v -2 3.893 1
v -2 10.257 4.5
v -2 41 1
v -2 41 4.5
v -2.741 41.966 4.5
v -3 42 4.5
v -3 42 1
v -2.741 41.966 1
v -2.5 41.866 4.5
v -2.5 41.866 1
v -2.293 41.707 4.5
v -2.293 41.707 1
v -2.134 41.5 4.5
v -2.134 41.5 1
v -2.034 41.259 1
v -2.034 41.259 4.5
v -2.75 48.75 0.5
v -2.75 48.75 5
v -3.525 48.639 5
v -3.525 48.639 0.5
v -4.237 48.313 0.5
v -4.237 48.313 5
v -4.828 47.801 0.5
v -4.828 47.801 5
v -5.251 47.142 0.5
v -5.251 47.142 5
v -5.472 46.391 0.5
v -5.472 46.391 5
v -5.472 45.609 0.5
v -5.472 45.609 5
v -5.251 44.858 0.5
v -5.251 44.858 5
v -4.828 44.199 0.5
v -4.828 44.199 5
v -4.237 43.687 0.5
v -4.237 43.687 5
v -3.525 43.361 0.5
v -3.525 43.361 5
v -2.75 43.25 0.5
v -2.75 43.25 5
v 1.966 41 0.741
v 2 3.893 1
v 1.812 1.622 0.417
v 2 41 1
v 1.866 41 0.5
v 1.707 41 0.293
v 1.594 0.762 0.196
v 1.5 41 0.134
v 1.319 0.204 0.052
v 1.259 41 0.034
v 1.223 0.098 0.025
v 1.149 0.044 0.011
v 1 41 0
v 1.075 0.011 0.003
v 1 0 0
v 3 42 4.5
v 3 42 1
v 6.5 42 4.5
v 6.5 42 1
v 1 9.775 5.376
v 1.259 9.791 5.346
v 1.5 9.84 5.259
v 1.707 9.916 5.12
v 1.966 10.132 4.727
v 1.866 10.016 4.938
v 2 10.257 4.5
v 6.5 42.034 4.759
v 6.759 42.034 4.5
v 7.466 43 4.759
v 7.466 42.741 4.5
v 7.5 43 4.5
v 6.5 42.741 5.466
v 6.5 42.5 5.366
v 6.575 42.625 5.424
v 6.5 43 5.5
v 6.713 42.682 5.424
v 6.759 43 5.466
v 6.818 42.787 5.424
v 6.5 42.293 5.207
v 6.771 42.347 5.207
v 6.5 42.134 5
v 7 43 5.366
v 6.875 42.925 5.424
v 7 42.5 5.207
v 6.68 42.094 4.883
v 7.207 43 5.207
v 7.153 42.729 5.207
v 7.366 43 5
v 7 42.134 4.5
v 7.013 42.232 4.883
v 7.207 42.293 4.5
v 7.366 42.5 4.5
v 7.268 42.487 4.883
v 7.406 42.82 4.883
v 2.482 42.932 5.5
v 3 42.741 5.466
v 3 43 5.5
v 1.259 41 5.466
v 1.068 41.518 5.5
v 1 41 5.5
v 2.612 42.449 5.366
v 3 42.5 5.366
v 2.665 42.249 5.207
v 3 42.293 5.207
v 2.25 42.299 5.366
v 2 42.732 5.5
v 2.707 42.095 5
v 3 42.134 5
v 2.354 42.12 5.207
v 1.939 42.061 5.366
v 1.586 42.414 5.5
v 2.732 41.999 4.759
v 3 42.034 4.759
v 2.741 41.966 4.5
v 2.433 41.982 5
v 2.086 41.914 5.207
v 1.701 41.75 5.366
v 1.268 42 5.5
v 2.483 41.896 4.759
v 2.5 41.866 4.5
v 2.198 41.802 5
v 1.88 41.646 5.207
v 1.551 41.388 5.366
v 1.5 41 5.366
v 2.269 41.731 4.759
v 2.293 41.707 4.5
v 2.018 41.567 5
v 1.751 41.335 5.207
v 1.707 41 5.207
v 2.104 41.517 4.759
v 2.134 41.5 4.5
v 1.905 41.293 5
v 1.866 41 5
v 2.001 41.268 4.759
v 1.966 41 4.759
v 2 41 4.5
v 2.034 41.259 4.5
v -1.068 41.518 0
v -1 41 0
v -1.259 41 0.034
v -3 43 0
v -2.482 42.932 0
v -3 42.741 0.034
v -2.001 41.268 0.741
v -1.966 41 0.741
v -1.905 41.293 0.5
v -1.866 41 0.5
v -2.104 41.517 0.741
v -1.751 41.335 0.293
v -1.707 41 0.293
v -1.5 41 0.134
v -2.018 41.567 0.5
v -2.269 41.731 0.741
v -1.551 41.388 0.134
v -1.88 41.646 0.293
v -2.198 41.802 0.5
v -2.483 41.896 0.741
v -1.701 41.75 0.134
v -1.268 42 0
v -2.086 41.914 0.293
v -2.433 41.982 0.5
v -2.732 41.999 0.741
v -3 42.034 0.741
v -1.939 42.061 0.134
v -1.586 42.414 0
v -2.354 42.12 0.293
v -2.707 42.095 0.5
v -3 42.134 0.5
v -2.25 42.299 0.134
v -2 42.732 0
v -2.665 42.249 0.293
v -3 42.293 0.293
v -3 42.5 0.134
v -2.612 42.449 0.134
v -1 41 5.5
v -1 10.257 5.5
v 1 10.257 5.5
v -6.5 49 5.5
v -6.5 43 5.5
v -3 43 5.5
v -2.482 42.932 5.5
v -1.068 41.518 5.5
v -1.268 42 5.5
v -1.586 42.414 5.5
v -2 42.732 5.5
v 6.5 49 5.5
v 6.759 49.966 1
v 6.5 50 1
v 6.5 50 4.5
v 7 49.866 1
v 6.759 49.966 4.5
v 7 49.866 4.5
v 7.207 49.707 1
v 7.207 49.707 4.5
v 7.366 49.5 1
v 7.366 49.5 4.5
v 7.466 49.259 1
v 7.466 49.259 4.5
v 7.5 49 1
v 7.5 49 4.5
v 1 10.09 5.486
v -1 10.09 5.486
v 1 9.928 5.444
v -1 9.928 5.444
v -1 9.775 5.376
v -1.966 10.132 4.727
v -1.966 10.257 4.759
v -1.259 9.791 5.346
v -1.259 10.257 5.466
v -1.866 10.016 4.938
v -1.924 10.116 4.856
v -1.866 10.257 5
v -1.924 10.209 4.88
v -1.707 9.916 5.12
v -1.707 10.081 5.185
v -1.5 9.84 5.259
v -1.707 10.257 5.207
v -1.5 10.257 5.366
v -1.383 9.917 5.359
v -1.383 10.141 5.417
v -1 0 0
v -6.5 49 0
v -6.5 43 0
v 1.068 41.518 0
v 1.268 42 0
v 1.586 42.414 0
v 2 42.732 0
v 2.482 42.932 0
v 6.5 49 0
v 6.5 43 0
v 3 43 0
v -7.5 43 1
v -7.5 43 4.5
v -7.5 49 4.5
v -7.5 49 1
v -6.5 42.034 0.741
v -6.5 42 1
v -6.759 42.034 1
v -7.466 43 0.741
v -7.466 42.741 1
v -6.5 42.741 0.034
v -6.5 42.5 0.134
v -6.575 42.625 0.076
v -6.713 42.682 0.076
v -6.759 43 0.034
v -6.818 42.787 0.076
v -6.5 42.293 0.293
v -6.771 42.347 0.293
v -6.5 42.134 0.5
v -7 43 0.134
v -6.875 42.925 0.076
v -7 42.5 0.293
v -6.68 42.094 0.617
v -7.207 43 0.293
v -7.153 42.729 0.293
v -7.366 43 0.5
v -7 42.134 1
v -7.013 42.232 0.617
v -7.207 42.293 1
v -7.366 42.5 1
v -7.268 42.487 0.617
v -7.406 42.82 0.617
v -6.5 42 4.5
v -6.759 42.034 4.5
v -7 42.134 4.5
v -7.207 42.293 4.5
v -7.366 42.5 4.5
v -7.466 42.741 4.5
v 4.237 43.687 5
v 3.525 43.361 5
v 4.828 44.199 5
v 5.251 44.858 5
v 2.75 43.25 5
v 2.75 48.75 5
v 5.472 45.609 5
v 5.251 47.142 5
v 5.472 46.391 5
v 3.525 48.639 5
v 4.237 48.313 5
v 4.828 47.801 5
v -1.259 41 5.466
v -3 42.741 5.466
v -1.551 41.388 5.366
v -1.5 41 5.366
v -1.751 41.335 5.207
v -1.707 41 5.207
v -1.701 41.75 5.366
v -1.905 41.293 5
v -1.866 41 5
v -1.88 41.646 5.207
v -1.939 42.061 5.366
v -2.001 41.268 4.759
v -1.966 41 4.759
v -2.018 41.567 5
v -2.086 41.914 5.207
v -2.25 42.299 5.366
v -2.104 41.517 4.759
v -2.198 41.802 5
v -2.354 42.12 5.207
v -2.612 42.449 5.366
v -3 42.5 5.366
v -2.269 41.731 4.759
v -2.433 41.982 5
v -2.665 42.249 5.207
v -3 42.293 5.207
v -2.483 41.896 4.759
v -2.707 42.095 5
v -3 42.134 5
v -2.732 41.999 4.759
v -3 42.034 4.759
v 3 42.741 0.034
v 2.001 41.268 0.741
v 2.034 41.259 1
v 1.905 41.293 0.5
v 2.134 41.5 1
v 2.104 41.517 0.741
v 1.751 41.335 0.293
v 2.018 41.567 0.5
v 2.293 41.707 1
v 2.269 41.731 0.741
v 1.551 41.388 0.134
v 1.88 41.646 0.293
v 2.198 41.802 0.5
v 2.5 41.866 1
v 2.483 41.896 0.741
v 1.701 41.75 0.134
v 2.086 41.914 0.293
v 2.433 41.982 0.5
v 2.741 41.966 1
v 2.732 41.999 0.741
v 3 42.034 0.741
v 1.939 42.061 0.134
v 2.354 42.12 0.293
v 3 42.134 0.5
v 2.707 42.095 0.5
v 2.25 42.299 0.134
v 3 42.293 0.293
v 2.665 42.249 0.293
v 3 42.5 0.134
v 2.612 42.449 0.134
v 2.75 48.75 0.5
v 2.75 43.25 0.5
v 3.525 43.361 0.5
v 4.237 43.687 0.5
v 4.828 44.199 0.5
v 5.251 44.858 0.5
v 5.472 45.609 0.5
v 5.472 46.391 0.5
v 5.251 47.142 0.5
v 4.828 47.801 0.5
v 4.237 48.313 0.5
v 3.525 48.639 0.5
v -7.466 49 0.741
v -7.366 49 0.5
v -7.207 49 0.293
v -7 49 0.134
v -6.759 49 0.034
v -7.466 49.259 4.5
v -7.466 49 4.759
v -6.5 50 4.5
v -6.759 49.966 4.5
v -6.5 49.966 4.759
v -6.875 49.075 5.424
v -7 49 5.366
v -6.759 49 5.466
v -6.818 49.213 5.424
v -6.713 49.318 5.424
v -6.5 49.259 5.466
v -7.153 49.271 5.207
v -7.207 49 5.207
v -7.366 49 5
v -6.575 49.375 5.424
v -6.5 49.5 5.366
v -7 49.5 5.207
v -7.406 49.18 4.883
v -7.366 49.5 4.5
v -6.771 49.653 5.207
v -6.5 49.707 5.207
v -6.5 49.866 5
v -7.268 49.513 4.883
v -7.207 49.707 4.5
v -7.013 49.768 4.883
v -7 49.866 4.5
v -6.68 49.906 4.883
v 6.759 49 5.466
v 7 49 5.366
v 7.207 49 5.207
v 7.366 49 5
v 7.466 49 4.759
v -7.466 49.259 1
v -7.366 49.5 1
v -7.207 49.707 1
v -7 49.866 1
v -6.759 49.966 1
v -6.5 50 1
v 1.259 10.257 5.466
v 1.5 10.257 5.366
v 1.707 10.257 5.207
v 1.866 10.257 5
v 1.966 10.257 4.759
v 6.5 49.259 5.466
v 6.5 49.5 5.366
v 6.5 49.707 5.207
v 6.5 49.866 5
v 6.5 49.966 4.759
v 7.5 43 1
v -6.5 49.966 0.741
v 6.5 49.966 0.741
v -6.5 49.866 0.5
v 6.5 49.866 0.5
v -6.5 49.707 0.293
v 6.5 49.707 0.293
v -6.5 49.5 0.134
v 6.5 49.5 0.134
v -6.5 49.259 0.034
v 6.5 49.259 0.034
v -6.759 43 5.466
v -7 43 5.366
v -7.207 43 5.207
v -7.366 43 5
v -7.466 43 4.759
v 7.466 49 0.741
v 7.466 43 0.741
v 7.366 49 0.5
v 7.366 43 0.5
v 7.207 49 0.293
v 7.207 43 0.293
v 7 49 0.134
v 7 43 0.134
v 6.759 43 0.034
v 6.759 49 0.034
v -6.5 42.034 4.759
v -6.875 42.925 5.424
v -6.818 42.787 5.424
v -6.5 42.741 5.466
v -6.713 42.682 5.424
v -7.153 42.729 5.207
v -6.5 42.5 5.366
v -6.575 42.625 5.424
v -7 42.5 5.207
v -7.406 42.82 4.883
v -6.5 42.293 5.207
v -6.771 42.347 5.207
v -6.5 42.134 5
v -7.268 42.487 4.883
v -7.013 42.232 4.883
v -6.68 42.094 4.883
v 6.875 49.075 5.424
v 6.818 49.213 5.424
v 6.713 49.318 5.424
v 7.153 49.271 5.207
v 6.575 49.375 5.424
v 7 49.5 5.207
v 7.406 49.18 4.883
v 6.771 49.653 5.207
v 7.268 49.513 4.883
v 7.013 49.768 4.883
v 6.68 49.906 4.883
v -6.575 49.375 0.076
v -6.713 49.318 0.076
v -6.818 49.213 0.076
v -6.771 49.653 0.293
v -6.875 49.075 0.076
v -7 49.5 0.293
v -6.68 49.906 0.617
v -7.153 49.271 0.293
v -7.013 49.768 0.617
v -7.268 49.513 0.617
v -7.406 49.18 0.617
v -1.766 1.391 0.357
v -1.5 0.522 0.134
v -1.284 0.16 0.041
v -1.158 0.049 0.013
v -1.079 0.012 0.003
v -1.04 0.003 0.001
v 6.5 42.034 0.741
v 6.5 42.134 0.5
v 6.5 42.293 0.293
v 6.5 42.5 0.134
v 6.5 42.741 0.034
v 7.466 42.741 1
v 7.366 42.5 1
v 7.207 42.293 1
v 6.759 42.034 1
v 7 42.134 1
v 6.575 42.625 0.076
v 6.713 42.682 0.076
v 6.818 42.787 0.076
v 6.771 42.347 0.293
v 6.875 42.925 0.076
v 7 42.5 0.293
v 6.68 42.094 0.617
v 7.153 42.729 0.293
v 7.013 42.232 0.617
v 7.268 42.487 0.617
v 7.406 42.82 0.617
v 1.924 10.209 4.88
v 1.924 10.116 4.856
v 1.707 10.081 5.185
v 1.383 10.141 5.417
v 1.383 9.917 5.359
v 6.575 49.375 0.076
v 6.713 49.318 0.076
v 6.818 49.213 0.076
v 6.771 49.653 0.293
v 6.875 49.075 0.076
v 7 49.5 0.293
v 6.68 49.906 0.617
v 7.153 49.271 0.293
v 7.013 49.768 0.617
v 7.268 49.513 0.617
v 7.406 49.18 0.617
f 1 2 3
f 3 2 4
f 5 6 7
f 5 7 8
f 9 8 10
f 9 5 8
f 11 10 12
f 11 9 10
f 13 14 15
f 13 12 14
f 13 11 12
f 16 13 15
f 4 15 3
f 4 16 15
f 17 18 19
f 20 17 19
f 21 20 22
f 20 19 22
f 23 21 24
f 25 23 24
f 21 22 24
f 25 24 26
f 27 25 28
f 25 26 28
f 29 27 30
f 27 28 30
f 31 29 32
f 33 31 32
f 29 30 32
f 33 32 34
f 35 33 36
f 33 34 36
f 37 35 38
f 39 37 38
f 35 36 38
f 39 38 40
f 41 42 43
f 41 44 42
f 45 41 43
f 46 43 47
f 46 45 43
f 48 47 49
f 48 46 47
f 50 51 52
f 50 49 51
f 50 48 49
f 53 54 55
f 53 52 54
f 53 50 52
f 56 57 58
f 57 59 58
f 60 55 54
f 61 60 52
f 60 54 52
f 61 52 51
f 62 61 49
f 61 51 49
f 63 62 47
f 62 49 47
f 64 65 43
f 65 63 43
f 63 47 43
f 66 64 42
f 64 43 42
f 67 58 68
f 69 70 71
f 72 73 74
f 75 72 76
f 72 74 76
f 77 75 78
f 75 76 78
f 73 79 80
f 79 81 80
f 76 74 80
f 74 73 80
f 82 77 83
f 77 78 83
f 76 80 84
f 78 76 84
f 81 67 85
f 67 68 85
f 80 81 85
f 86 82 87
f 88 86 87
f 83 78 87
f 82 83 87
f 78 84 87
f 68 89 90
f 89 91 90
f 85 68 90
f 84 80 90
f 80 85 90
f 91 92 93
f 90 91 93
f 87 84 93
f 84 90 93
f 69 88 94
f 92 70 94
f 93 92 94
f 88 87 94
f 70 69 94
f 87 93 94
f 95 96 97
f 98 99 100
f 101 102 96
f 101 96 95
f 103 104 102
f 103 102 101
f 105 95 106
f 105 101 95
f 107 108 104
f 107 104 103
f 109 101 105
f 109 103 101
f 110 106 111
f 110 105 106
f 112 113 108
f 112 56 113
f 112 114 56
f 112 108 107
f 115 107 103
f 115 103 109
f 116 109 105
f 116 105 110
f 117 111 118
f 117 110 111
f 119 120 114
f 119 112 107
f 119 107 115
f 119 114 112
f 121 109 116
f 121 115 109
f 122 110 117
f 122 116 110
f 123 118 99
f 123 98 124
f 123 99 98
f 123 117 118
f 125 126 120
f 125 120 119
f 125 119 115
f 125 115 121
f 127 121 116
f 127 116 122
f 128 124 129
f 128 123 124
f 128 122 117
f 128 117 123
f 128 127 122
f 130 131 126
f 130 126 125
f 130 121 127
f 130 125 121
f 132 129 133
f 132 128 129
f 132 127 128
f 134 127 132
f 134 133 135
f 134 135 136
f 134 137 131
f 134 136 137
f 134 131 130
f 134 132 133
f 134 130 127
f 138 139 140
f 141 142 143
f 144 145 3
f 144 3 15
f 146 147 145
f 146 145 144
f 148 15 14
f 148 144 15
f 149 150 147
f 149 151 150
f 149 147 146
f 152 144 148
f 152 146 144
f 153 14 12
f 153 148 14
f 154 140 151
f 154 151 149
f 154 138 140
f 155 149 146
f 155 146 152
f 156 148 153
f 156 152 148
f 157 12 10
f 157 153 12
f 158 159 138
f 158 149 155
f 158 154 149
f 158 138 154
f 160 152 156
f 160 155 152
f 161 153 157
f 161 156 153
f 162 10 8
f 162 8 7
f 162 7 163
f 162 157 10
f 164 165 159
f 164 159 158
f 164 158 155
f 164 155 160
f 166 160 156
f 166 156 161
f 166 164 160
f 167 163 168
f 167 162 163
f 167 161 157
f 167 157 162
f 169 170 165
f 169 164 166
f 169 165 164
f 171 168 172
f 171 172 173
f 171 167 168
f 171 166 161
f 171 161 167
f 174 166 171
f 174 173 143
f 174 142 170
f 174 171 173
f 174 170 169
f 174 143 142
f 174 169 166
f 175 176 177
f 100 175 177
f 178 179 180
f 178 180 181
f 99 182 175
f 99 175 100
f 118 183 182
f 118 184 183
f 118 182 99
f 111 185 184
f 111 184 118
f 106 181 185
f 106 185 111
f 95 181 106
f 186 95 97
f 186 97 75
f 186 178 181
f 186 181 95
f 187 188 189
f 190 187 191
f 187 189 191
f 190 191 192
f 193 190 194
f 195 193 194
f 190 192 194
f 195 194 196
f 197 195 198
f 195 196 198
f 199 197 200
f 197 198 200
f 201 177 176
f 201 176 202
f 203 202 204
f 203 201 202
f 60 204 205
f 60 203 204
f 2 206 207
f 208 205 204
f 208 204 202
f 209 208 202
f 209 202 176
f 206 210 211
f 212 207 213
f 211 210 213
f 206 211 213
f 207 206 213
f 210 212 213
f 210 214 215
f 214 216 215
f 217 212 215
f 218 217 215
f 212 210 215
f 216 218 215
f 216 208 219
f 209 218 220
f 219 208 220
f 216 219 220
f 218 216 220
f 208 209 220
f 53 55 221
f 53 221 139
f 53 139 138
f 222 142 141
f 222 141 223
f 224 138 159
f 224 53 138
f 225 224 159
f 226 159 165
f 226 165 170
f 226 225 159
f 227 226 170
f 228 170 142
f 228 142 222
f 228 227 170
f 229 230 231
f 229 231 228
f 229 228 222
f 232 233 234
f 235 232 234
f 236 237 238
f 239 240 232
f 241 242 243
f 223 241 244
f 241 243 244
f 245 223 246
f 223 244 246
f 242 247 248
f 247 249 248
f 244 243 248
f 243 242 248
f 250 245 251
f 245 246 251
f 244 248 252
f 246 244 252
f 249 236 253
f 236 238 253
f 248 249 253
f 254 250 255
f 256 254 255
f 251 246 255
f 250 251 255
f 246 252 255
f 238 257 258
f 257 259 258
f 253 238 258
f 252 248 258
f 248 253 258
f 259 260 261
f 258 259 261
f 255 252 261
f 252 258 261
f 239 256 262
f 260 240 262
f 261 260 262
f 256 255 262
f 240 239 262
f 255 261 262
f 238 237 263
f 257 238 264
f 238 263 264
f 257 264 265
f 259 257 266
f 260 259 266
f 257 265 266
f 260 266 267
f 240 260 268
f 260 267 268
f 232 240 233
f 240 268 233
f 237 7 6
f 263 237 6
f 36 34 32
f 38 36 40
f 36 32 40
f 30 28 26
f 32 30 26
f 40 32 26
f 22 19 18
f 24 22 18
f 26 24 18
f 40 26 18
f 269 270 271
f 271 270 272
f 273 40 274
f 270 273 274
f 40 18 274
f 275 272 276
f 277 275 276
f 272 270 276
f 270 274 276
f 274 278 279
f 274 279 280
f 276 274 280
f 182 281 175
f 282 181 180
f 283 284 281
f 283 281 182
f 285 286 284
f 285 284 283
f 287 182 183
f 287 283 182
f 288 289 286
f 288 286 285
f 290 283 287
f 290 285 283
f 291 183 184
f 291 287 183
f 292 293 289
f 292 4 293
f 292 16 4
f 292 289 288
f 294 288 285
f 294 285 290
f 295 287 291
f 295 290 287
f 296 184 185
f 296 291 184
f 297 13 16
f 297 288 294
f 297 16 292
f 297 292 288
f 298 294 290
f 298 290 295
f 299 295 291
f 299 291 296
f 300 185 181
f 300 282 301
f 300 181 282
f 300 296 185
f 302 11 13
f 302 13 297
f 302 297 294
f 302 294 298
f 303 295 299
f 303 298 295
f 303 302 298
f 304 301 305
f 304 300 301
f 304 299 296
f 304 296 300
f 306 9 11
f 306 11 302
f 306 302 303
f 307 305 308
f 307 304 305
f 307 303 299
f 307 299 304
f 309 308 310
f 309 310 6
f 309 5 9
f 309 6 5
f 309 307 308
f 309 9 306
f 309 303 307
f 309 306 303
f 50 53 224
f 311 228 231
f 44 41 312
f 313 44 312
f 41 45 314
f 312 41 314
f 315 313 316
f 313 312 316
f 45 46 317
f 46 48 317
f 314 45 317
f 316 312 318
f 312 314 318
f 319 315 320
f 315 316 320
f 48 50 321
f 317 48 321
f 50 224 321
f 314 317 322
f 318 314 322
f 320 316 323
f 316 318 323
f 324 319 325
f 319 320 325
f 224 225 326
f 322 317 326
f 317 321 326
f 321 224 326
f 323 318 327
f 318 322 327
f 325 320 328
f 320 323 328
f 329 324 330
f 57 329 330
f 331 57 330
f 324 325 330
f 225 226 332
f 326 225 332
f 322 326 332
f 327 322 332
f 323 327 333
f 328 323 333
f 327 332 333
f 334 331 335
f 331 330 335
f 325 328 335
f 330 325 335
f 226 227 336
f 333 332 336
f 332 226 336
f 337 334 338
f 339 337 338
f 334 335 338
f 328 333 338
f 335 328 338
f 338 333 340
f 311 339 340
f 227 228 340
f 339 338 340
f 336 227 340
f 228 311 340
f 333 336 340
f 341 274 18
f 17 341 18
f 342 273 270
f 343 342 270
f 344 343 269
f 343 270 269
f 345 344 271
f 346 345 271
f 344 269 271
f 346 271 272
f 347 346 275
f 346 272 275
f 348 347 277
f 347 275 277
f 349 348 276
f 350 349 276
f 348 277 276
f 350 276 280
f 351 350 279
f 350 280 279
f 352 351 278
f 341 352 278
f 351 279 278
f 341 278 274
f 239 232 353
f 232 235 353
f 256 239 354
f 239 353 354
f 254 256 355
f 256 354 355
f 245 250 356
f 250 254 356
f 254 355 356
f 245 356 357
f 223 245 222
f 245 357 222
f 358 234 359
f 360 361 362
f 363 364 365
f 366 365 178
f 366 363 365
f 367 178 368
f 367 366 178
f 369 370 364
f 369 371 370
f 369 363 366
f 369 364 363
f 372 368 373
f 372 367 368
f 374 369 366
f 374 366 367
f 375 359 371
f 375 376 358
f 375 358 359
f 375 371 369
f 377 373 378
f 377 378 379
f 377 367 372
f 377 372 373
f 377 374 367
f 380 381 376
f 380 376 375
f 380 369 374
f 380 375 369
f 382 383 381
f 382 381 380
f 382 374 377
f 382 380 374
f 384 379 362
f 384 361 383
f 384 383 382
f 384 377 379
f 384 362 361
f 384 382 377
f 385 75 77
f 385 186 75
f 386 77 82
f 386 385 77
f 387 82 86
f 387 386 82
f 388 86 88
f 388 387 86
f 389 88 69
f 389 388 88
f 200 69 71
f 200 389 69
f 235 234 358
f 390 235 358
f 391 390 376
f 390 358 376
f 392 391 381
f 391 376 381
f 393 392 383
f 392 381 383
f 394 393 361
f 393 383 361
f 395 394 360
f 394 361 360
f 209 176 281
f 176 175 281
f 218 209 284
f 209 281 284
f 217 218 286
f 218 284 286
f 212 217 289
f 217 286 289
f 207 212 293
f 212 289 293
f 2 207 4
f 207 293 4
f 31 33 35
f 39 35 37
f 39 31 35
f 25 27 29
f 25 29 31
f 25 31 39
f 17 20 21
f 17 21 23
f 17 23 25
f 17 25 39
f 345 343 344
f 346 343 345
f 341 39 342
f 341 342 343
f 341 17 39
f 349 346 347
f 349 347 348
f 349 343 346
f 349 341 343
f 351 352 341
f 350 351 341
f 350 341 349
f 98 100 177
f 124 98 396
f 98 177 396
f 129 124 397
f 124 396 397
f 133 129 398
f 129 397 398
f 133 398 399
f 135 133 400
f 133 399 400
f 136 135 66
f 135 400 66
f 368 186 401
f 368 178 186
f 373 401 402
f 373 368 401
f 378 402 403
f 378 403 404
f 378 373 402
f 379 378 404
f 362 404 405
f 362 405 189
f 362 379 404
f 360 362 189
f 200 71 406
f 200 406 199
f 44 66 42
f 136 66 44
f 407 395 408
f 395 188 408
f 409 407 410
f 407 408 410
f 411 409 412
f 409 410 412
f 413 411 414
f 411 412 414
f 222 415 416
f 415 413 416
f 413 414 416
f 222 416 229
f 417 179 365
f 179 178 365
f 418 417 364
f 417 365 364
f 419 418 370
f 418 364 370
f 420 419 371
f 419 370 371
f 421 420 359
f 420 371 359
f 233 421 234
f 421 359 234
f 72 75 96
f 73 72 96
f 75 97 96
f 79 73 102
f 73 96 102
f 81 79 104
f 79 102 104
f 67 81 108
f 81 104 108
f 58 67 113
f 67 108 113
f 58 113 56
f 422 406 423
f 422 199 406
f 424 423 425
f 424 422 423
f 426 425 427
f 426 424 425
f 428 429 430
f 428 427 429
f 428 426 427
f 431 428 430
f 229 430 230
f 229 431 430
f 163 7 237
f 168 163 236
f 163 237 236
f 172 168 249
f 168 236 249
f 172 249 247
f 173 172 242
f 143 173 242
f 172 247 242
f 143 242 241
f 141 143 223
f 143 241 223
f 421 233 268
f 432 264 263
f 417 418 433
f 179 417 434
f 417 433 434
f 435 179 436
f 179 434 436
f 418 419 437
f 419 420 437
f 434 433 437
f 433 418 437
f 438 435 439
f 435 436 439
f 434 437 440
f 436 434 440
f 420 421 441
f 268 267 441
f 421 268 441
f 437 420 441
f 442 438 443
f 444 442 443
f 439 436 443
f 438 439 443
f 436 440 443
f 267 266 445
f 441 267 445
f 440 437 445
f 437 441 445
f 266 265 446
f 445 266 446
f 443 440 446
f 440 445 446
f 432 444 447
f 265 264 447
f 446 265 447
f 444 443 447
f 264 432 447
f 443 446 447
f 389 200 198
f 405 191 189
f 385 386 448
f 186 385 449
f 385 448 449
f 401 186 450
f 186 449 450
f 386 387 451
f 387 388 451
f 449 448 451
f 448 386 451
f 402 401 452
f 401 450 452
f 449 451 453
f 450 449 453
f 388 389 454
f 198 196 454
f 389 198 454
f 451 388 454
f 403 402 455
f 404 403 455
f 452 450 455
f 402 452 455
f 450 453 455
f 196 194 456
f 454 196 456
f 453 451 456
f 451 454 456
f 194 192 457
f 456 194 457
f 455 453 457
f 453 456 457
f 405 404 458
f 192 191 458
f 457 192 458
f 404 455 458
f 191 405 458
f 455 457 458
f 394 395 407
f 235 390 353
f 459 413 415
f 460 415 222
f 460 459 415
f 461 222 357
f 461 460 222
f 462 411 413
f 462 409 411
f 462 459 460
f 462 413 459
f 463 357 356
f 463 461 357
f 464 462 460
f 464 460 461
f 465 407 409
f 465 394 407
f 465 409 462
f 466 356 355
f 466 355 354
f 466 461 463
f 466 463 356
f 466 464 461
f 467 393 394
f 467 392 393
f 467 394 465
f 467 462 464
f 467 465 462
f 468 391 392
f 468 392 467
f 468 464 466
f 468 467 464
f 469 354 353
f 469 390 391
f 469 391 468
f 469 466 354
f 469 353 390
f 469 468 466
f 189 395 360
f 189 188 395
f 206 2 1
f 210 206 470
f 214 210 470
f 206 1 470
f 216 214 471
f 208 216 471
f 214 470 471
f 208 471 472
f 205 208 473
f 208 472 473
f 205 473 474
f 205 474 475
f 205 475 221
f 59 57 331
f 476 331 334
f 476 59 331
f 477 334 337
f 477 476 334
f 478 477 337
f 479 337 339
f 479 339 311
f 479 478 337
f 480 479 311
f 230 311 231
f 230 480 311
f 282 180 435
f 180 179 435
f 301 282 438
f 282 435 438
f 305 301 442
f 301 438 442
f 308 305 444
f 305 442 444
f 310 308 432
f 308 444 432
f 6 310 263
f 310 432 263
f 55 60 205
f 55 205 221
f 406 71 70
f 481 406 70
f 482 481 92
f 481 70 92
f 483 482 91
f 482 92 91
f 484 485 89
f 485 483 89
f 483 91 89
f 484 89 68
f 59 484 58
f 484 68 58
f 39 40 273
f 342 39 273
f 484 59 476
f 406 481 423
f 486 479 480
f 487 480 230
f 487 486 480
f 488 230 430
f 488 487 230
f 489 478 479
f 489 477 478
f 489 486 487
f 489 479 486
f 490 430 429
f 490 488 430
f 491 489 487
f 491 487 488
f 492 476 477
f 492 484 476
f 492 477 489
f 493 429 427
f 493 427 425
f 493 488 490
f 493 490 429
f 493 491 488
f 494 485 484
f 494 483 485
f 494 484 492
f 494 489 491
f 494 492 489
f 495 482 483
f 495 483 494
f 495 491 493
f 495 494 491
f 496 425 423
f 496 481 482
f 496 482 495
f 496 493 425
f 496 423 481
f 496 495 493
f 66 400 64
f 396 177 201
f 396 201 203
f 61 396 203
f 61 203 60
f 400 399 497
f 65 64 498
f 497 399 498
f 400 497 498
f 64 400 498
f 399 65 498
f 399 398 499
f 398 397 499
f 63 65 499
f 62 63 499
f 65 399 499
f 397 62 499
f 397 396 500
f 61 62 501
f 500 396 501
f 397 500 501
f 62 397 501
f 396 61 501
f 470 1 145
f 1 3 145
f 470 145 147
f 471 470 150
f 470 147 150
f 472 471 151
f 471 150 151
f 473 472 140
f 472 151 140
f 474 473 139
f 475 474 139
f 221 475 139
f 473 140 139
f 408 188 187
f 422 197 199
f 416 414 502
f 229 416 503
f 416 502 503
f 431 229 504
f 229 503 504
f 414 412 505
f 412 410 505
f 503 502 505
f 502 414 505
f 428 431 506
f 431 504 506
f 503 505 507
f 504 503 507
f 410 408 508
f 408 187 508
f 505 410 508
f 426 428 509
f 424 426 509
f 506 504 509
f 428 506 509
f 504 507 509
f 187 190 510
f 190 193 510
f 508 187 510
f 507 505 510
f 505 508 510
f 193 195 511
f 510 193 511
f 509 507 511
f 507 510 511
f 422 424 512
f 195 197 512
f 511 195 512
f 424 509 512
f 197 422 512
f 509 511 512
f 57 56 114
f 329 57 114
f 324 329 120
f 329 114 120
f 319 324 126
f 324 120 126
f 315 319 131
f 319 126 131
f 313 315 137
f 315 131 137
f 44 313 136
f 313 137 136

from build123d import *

# Parameters (mm, degrees)
F1_DEPTH = 2
F0_W     = 8
F0_H     = 5.5
F2_DEPTH = 7.5
F4_DEPTH = 5
F5_DEPTH = 0.5
F6_F1_R  = 1
F6_F2_R  = 1


with BuildPart() as f1:
    # F0 (on Right) → F1 (new body, symmetric)
    with BuildSketch(Plane.YZ):
        Polygon((42, 5.5), (10, 5.5), (0, 0), (42, 0), align=None)
    extrude(amount=F1_DEPTH, both=True)

    # F0 (on Right) → F2 (join, symmetric)
    with BuildSketch(Plane.YZ):
        with Locations((46, 2.75)):
            Rectangle(F0_W, F0_H)
    extrude(amount=F2_DEPTH, both=True)

    # F3 (on face) → F4 (cut)
    with BuildSketch(Plane.XY.offset(5.5)):
        with BuildLine():
            ThreePointArc((-2.75, 48.75), (-5.5, 46), (-2.75, 43.25))
            Line((-2.75, 43.25), (2.75, 43.25))
            ThreePointArc((2.75, 43.25), (5.5, 46), (2.75, 48.75))
            Line((2.75, 48.75), (-2.75, 48.75))
        make_face()
    extrude(amount=-F4_DEPTH, mode=Mode.SUBTRACT)

    # F3 (on face) → F5 (join)
    with BuildSketch(Plane.XY.offset(5.5)):
        with BuildLine():
            ThreePointArc((-2.75, 48.75), (-5.5, 46), (-2.75, 43.25))
            Line((-2.75, 43.25), (2.75, 43.25))
            ThreePointArc((2.75, 43.25), (5.5, 46), (2.75, 48.75))
            Line((2.75, 48.75), (-2.75, 48.75))
        make_face()
    extrude(amount=-F5_DEPTH)

    # F6: fillet of radius 1 on 21 edges, made by hand

    # F6_f1
    f6_f1_edges = [f1.edges().sort_by_distance(p)[0] for p in [
        (2, 42, 2.75),
        (-2, 42, 2.75),
    ]]
    fillet(f6_f1_edges, radius=F6_F1_R)

    # F6_f2
    f6_f2_edges = [f1.edges().sort_by_distance(p)[0] for p in [
        (-7.5, 42, 2.75),
        (-7.5, 50, 2.75),
        (7.5, 50, 2.75),
        (7.5, 42, 2.75),
        (-7.5, 46, 5.5),
        (-5.25, 42, 5.5),
        (-2, 25.5, 5.5),
        (0, 10, 5.5),
        (2, 25.5, 5.5),
        (5.25, 42, 5.5),
        (7.5, 46, 5.5),
        (0, 50, 5.5),
        (2, 5, 2.75),
        (2, 20.5, 0),
        (-2, 5, 2.75),
        (-2, 20.5, 0),
        (0, 50, 0),
        (7.5, 46, 0),
        (-7.5, 46, 0),
        (-2.2928932188, 41.7071067812, 0),
        (2.2928932188, 41.7071067812, 0),
        (2.2928932188, 41.7071067812, 5.5),
        (-2.2928932188, 41.7071067812, 5.5),
    ]]
    fillet(f6_f2_edges, radius=F6_F2_R)


solid = f1.part
